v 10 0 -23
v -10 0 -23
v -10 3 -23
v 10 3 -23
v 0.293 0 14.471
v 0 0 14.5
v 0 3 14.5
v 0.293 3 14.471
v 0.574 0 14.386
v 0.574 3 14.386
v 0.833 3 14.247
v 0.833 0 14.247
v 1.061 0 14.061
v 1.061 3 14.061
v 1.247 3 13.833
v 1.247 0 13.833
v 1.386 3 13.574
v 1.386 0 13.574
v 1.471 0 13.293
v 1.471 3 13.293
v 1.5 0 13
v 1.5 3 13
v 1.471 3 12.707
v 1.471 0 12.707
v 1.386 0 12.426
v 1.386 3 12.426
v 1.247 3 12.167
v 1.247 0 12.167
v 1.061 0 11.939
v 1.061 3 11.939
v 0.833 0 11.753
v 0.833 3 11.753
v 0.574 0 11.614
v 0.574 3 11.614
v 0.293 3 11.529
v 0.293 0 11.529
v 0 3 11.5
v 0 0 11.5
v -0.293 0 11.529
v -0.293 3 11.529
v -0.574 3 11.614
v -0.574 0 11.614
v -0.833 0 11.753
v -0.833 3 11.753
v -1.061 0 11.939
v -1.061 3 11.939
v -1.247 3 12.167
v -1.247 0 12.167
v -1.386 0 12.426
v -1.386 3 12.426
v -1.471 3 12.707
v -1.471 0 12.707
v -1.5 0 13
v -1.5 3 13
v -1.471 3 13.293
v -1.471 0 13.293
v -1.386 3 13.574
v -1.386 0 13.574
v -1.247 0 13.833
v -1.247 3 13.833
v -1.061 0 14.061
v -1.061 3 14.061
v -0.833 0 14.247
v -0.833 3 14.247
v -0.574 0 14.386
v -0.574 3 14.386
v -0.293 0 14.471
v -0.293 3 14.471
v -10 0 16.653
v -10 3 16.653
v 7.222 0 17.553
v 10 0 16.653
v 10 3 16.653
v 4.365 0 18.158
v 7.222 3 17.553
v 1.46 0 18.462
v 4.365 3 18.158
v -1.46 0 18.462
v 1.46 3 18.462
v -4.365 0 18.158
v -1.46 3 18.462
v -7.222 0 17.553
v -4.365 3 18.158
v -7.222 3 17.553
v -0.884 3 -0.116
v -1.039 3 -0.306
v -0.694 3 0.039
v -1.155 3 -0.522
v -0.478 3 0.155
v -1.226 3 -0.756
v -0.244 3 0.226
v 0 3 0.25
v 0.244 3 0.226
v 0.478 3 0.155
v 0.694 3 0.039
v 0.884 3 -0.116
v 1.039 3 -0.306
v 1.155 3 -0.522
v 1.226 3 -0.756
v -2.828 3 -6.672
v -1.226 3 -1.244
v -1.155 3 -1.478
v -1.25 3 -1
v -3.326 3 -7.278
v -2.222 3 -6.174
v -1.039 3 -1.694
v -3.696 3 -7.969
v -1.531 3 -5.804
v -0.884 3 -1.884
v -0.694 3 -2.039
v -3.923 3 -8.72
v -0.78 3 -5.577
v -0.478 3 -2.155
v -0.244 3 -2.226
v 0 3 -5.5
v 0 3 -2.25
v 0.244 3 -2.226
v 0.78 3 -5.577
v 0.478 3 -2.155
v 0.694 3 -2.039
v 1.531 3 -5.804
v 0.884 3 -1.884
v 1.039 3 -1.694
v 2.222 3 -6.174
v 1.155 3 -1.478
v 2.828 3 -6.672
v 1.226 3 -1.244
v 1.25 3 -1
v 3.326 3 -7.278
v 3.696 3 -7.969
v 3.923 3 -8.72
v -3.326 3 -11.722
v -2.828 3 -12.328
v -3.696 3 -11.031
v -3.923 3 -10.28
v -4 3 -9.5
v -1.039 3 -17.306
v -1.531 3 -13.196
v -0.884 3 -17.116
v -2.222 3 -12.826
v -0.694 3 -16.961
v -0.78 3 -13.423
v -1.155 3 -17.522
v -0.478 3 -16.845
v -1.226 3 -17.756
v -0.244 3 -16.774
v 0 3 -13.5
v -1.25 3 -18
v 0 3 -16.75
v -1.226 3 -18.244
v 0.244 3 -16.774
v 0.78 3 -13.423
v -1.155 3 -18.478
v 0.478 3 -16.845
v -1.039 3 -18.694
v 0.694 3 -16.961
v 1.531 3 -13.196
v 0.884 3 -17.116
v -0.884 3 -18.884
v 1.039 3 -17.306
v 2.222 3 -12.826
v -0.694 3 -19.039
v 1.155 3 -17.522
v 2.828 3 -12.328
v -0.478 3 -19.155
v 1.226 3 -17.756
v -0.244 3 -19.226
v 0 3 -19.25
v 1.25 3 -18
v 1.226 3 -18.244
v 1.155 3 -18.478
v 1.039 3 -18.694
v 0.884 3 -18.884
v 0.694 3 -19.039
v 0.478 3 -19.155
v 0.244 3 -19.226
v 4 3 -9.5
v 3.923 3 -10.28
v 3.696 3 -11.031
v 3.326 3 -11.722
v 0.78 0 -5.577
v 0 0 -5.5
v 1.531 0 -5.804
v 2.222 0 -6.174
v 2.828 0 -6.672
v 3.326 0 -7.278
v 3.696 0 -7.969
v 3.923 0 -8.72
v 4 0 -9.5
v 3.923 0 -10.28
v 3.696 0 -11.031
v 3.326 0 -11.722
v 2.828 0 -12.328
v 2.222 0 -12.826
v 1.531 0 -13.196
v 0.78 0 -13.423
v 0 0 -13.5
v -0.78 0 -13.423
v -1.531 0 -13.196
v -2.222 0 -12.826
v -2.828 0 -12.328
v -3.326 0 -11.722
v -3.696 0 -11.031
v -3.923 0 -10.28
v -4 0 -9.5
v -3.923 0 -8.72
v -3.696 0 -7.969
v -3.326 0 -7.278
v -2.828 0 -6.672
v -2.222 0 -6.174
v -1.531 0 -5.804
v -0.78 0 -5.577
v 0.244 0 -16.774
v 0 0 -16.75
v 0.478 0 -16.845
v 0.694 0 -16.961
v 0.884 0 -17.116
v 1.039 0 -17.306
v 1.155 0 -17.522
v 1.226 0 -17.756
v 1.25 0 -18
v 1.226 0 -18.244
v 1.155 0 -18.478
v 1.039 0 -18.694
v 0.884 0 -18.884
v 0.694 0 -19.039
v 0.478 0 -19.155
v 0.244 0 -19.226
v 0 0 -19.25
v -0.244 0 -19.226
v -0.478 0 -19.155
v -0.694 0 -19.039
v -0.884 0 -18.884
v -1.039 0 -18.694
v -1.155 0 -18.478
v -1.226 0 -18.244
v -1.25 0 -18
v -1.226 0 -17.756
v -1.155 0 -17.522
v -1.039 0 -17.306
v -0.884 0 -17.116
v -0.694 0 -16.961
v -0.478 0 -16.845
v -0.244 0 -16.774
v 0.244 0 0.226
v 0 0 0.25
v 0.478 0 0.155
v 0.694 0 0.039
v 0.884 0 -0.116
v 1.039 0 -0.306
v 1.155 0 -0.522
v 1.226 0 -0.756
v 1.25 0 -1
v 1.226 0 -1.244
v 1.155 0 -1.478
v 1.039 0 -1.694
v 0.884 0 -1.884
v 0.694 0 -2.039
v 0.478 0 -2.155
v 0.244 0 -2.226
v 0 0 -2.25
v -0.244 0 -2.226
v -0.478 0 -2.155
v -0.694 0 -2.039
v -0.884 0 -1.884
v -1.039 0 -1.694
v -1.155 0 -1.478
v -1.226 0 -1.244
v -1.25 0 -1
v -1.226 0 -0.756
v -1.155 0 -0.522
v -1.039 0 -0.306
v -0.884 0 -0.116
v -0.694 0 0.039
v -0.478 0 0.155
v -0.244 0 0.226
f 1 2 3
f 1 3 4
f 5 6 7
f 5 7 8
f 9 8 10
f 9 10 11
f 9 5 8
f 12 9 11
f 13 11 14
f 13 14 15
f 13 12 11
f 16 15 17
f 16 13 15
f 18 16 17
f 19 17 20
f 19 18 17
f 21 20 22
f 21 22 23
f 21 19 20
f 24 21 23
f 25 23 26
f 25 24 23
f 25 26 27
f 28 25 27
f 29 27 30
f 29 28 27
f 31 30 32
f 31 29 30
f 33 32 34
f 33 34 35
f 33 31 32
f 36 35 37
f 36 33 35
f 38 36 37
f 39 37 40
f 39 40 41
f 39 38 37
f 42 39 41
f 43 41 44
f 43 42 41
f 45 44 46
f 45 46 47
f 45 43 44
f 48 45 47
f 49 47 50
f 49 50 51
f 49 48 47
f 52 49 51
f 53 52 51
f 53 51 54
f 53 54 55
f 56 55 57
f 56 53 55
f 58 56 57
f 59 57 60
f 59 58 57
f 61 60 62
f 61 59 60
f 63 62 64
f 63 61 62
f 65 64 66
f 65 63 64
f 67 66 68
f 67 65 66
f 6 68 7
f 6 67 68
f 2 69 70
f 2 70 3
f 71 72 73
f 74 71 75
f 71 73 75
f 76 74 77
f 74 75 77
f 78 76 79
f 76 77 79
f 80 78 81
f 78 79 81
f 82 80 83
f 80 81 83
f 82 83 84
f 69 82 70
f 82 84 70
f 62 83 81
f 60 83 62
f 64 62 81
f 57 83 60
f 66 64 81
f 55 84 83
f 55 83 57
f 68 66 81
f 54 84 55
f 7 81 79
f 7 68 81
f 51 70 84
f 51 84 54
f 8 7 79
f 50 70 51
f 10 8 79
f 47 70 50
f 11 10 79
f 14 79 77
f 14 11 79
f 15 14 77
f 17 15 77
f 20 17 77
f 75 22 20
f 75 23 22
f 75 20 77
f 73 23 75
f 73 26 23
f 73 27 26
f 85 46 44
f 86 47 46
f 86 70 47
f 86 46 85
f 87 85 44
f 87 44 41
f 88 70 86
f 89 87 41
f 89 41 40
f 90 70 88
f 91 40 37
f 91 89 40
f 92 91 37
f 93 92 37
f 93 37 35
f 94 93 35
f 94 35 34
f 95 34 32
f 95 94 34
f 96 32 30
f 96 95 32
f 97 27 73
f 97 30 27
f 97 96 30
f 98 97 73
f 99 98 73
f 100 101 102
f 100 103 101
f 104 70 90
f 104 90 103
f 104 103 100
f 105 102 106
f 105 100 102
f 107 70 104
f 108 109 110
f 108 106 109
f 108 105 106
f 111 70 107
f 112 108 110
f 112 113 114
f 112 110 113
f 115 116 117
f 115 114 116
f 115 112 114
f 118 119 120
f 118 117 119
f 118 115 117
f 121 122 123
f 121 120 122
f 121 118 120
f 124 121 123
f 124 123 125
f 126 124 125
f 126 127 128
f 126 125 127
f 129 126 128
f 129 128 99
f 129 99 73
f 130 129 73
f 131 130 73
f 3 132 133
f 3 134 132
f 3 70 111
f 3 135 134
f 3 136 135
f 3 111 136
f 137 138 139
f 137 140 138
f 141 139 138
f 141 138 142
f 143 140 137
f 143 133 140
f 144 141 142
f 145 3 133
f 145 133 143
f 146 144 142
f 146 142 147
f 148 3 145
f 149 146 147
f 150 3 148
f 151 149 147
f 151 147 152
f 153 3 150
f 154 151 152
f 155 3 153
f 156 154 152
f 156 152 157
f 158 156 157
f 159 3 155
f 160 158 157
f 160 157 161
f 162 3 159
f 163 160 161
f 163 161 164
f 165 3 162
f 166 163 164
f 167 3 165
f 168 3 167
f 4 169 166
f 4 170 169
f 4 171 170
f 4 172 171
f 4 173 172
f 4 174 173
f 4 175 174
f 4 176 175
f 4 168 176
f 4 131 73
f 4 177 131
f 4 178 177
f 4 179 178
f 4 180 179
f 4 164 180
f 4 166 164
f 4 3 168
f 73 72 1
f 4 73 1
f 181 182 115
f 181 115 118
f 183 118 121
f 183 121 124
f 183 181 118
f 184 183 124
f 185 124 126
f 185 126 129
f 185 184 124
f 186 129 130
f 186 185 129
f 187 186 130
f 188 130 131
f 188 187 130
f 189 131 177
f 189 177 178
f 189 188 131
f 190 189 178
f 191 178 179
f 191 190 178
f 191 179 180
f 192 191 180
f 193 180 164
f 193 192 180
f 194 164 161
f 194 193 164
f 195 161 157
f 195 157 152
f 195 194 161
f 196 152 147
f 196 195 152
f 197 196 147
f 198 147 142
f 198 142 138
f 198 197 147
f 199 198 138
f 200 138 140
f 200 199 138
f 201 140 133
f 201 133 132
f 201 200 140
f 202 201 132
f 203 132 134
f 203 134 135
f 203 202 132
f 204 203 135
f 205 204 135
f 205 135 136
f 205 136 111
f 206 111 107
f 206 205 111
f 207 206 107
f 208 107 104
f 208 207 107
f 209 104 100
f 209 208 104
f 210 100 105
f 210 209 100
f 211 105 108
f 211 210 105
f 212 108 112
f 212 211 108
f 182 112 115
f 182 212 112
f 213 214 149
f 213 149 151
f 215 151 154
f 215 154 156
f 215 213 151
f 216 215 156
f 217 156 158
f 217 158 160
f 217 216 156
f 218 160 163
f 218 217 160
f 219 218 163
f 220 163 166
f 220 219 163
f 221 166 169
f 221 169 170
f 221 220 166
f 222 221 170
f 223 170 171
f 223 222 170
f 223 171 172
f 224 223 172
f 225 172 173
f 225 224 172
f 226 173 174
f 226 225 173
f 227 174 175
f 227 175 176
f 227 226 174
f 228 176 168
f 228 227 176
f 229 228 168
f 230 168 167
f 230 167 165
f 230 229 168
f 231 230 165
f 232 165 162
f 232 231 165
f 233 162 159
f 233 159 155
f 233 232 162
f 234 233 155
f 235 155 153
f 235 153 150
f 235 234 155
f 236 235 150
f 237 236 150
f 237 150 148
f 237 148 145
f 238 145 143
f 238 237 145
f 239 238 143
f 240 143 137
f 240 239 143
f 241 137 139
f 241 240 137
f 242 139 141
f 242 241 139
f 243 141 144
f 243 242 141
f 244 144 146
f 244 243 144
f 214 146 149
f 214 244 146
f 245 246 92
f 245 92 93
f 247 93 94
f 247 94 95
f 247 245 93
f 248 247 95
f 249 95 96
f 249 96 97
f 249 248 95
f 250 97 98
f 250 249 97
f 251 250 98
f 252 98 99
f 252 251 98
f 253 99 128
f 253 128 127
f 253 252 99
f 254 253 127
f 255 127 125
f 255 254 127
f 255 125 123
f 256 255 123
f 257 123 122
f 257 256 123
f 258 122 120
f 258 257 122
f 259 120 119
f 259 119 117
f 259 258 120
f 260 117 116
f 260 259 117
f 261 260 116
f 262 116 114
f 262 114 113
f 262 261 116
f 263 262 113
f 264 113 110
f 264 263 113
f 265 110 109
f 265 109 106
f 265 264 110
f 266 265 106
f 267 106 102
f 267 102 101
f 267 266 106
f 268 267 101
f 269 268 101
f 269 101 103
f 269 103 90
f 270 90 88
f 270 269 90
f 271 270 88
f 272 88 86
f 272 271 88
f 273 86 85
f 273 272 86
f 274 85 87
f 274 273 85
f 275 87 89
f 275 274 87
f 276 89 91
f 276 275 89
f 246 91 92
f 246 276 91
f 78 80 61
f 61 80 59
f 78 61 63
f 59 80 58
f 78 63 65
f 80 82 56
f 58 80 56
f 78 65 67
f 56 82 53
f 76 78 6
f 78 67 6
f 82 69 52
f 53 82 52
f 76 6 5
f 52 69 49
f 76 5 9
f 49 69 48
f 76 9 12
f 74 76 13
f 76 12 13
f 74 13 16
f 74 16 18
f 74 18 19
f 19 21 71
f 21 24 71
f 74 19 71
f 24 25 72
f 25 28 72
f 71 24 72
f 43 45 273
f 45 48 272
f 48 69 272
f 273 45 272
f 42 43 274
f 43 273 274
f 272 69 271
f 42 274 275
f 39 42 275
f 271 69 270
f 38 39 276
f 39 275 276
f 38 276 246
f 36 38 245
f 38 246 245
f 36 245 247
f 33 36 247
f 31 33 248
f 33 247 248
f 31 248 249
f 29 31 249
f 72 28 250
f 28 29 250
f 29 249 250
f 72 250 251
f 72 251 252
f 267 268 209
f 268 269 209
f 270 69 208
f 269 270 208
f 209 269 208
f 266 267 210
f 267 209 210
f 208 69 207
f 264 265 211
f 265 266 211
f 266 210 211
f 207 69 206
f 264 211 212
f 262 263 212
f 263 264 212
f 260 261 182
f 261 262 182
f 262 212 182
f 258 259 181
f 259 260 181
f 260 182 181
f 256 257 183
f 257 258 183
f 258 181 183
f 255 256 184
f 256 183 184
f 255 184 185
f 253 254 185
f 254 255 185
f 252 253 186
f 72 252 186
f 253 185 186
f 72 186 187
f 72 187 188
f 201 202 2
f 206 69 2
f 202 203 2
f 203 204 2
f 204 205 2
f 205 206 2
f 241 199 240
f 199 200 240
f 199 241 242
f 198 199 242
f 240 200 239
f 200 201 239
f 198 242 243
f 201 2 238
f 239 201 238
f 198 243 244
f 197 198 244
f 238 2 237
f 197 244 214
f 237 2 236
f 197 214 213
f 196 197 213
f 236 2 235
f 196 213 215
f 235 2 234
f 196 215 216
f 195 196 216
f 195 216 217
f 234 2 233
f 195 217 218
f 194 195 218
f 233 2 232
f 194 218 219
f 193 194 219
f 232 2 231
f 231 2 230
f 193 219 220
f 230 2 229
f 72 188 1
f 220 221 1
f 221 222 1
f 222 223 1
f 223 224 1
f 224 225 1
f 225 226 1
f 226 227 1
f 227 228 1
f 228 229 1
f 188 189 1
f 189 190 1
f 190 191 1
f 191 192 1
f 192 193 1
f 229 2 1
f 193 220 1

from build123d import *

# Parameters (mm, degrees)
SKETCH1_W           = 20
SKETCH1_H           = 46
SKETCH1_R           = 1.25
SKETCH1_R_2         = 4
SKETCH1_R_3         = 1.5
BOSS_EXTRUDE1_DEPTH = 3
SKETCH2_W           = 20
SKETCH2_H           = 13.653393661
CUT_EXTRUDE4_DEPTH  = 26.258661881


with BuildPart() as part:
    # Sketch1 → Boss-Extrude1 (new body)
    with BuildSketch(Plane(origin=(0, 0, 0), x_dir=(1, 0, 0), z_dir=(0, 1, 0))):
        Rectangle(SKETCH1_W, SKETCH1_H)
        with Locations(Location((0, 18, 0), (0, 0, 270))):
            Circle(SKETCH1_R, mode=Mode.SUBTRACT)
        with Locations(Location((0, 1, 0), (0, 0, 270))):
            Circle(SKETCH1_R, mode=Mode.SUBTRACT)
        with Locations(Location((0, 9.5, 0), (0, 0, 270))):
            Circle(SKETCH1_R_2, mode=Mode.SUBTRACT)
        with Locations(Location((0, -13, 0), (0, 0, 270))):
            Circle(SKETCH1_R_3, mode=Mode.SUBTRACT)
    extrude(amount=BOSS_EXTRUDE1_DEPTH)

    # Sketch2 → Cut-Extrude4 (cut, through all)
    with BuildSketch(Plane(origin=(0, 3, 0), x_dir=(1, 0, 0), z_dir=(0, 1, 0))):
        with Locations((0, -29.826696831)):
            Rectangle(SKETCH2_W, SKETCH2_H)
        with BuildLine():
            Line((10, -23), (10, -16.653393661))
            ThreePointArc((10, -16.653393661), (0, -18.5), (-10, -16.653393661))
            Line((-10, -16.653393661), (-10, -23))
            Line((-10, -23), (10, -23))
        make_face()
    extrude(amount=-CUT_EXTRUDE4_DEPTH, mode=Mode.SUBTRACT)


solid = part.part
